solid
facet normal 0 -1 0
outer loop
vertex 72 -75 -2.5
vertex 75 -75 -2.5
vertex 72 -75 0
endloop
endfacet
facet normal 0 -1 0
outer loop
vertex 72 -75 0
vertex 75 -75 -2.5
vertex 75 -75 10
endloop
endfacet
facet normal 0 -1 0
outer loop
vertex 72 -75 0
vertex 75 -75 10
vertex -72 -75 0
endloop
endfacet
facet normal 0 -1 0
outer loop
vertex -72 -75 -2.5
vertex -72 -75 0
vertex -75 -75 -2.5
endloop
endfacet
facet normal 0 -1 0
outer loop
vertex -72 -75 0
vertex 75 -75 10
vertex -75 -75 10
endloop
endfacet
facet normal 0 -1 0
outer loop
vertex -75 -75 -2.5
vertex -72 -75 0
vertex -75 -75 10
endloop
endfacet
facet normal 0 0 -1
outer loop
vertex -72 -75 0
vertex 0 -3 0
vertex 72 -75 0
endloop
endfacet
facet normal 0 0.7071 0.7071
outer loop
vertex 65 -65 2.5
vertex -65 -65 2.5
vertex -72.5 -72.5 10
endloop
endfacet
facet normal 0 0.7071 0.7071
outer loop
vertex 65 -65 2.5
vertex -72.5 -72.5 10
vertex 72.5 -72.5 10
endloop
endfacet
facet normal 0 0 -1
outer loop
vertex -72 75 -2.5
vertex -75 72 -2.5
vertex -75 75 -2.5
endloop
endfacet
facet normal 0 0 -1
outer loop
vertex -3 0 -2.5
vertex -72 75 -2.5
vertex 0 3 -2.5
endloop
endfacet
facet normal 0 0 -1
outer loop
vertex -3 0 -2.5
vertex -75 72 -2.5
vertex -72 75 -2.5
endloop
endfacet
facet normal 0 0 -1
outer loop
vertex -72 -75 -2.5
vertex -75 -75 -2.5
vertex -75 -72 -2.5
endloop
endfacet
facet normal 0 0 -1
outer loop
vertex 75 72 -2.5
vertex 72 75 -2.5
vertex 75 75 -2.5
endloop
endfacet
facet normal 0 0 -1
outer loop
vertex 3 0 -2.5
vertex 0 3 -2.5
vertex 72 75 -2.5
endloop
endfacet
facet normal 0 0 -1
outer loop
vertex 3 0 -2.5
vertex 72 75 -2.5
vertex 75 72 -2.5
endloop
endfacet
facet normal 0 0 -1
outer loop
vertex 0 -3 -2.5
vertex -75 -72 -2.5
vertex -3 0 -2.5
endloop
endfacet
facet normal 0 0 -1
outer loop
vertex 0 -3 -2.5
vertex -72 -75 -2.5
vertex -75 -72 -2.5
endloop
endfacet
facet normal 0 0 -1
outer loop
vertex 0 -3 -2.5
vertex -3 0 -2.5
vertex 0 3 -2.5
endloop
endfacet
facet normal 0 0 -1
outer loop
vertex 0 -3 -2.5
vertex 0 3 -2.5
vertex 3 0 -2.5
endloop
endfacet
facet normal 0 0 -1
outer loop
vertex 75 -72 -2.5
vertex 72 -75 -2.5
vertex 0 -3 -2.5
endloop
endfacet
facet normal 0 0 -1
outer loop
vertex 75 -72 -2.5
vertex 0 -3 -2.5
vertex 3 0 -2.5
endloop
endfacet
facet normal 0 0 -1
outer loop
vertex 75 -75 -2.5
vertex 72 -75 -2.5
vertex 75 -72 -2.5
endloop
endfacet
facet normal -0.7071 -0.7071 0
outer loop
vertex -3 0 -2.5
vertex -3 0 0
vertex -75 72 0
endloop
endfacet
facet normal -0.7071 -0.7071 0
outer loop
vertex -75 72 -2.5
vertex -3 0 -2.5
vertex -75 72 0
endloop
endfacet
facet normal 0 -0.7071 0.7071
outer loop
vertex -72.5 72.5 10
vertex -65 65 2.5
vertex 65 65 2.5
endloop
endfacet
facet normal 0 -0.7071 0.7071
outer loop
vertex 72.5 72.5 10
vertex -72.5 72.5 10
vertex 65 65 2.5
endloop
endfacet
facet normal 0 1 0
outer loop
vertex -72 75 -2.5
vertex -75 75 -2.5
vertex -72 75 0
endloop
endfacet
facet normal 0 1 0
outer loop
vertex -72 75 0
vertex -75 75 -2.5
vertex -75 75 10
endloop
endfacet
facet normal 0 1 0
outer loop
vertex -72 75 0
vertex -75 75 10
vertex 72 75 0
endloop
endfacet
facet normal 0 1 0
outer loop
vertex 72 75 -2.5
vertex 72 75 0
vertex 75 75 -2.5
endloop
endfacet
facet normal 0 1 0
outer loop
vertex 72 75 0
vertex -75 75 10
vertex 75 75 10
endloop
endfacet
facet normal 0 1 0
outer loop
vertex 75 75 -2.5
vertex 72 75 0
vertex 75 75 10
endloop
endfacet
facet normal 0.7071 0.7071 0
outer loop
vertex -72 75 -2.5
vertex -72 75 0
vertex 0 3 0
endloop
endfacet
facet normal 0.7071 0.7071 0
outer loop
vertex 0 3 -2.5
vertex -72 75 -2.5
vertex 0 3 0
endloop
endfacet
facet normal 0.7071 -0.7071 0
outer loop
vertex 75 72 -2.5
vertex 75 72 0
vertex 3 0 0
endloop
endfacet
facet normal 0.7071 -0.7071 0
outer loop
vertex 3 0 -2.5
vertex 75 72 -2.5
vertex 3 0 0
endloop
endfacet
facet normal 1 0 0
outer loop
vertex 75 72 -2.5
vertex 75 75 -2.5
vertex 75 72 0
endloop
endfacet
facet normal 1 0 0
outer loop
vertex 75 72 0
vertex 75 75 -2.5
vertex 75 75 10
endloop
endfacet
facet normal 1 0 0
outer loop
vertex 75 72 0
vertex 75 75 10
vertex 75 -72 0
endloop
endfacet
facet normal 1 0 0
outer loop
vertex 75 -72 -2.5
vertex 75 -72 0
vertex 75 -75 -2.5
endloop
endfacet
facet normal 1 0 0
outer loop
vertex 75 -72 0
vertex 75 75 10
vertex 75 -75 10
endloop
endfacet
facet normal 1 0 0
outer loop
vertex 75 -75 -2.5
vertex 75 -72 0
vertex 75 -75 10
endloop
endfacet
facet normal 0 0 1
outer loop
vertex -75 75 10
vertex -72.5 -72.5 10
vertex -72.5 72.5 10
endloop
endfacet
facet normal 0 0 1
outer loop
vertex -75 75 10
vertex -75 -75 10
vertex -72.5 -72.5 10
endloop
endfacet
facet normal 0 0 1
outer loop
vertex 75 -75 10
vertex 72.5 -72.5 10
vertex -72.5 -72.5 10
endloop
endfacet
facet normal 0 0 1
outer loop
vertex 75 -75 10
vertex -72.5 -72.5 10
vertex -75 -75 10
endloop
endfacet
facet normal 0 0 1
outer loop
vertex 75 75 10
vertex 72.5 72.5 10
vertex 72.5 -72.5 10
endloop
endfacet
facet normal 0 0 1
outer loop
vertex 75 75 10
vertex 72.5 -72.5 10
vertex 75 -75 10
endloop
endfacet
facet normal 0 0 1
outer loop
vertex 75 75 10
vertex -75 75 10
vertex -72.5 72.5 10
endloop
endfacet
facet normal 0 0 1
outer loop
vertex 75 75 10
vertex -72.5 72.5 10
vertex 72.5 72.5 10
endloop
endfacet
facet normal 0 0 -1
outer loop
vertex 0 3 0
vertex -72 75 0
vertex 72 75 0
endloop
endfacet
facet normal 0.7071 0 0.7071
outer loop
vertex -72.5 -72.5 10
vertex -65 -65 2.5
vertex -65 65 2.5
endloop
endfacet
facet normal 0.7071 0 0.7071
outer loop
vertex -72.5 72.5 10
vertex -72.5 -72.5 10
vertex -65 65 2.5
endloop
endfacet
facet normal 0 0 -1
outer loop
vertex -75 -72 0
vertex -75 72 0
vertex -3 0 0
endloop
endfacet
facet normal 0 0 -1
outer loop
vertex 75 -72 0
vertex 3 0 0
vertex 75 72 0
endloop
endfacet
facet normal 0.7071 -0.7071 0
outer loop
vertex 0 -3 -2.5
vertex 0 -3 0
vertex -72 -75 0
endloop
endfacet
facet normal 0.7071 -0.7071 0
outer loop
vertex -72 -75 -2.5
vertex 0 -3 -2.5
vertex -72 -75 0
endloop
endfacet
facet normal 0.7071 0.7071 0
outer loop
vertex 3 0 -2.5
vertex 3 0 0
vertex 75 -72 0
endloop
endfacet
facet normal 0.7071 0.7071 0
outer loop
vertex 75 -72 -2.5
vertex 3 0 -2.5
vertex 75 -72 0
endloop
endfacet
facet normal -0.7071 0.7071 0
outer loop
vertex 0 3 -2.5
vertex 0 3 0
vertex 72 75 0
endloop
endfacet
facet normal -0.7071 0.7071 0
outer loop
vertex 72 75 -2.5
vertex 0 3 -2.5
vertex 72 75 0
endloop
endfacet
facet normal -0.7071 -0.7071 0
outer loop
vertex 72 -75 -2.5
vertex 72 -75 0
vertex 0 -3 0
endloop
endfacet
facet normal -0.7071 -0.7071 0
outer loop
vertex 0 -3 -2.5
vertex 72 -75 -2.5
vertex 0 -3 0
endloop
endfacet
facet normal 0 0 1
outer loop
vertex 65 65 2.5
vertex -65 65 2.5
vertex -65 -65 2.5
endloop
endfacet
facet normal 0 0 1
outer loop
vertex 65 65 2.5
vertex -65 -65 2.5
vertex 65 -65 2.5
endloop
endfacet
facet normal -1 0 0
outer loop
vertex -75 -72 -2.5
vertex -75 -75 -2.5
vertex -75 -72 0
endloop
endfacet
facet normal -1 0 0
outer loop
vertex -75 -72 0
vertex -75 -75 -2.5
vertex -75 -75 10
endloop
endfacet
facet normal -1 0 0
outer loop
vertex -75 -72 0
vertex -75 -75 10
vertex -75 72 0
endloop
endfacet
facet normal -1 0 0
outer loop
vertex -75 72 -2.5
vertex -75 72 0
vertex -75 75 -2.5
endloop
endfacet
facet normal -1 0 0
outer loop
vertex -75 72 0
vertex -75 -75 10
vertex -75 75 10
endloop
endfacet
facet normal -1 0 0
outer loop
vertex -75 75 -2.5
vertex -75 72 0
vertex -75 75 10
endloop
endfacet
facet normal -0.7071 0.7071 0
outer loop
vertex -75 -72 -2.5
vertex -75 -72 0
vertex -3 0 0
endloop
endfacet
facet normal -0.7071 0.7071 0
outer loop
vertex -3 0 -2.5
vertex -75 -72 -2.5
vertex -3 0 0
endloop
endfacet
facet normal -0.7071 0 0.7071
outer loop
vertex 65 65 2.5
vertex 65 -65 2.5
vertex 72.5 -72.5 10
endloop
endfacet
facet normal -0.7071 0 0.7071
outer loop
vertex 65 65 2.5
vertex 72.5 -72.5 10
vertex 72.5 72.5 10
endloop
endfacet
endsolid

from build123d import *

# Parameters (mm, degrees)
F0_W     = 150
F0_H     = 150
F1_DEPTH = 10
F2_T     = -2.5
F3_SIZE  = 7.49999
F5_DEPTH = 2.5


# Not quite as in the source:
# - a fillet or chamfer is up to 0.001 mm smaller than in the source, because OpenCascade refuses the exact size


with BuildPart() as f1:
    # F0 (on Top) → F1 (new body)
    with BuildSketch(Plane.XY):
        Rectangle(F0_W, F0_H)
    extrude(amount=F1_DEPTH)

    # F2
    f2_openings = [f1.faces().sort_by_distance(p)[0] for p in [
        (0, 0, 10),
    ]]
    offset(amount=F2_T, openings=f2_openings)

    # F3 (size 7.5 in the source; OpenCascade refuses exactly that, so slightly less here)
    f3_edges = [f1.edges().sort_by_distance(p)[0] for p in [
        (-72.5, 0, 2.5),
        (0, 72.5, 2.5),
        (72.5, 0, 2.5),
        (0, -72.5, 2.5),
    ]]
    chamfer(f3_edges, length=F3_SIZE)

    # F4 (on face) → F5 (join)
    with BuildSketch(Plane(origin=(0, 0, 0), x_dir=(1, 0, 0), z_dir=(0, 0, -1))):
        Polygon((0, 3), (-72, 75), (-75, 75), (-75, 72), (-3, 0), (-75, -72), (-75, -75), (-72, -75), (0, -3), (72, -75), (75, -75), (75, -72), (3, 0), (75, 72), (75, 75), (72, 75), align=None)
    extrude(amount=F5_DEPTH)


solid = f1.part
